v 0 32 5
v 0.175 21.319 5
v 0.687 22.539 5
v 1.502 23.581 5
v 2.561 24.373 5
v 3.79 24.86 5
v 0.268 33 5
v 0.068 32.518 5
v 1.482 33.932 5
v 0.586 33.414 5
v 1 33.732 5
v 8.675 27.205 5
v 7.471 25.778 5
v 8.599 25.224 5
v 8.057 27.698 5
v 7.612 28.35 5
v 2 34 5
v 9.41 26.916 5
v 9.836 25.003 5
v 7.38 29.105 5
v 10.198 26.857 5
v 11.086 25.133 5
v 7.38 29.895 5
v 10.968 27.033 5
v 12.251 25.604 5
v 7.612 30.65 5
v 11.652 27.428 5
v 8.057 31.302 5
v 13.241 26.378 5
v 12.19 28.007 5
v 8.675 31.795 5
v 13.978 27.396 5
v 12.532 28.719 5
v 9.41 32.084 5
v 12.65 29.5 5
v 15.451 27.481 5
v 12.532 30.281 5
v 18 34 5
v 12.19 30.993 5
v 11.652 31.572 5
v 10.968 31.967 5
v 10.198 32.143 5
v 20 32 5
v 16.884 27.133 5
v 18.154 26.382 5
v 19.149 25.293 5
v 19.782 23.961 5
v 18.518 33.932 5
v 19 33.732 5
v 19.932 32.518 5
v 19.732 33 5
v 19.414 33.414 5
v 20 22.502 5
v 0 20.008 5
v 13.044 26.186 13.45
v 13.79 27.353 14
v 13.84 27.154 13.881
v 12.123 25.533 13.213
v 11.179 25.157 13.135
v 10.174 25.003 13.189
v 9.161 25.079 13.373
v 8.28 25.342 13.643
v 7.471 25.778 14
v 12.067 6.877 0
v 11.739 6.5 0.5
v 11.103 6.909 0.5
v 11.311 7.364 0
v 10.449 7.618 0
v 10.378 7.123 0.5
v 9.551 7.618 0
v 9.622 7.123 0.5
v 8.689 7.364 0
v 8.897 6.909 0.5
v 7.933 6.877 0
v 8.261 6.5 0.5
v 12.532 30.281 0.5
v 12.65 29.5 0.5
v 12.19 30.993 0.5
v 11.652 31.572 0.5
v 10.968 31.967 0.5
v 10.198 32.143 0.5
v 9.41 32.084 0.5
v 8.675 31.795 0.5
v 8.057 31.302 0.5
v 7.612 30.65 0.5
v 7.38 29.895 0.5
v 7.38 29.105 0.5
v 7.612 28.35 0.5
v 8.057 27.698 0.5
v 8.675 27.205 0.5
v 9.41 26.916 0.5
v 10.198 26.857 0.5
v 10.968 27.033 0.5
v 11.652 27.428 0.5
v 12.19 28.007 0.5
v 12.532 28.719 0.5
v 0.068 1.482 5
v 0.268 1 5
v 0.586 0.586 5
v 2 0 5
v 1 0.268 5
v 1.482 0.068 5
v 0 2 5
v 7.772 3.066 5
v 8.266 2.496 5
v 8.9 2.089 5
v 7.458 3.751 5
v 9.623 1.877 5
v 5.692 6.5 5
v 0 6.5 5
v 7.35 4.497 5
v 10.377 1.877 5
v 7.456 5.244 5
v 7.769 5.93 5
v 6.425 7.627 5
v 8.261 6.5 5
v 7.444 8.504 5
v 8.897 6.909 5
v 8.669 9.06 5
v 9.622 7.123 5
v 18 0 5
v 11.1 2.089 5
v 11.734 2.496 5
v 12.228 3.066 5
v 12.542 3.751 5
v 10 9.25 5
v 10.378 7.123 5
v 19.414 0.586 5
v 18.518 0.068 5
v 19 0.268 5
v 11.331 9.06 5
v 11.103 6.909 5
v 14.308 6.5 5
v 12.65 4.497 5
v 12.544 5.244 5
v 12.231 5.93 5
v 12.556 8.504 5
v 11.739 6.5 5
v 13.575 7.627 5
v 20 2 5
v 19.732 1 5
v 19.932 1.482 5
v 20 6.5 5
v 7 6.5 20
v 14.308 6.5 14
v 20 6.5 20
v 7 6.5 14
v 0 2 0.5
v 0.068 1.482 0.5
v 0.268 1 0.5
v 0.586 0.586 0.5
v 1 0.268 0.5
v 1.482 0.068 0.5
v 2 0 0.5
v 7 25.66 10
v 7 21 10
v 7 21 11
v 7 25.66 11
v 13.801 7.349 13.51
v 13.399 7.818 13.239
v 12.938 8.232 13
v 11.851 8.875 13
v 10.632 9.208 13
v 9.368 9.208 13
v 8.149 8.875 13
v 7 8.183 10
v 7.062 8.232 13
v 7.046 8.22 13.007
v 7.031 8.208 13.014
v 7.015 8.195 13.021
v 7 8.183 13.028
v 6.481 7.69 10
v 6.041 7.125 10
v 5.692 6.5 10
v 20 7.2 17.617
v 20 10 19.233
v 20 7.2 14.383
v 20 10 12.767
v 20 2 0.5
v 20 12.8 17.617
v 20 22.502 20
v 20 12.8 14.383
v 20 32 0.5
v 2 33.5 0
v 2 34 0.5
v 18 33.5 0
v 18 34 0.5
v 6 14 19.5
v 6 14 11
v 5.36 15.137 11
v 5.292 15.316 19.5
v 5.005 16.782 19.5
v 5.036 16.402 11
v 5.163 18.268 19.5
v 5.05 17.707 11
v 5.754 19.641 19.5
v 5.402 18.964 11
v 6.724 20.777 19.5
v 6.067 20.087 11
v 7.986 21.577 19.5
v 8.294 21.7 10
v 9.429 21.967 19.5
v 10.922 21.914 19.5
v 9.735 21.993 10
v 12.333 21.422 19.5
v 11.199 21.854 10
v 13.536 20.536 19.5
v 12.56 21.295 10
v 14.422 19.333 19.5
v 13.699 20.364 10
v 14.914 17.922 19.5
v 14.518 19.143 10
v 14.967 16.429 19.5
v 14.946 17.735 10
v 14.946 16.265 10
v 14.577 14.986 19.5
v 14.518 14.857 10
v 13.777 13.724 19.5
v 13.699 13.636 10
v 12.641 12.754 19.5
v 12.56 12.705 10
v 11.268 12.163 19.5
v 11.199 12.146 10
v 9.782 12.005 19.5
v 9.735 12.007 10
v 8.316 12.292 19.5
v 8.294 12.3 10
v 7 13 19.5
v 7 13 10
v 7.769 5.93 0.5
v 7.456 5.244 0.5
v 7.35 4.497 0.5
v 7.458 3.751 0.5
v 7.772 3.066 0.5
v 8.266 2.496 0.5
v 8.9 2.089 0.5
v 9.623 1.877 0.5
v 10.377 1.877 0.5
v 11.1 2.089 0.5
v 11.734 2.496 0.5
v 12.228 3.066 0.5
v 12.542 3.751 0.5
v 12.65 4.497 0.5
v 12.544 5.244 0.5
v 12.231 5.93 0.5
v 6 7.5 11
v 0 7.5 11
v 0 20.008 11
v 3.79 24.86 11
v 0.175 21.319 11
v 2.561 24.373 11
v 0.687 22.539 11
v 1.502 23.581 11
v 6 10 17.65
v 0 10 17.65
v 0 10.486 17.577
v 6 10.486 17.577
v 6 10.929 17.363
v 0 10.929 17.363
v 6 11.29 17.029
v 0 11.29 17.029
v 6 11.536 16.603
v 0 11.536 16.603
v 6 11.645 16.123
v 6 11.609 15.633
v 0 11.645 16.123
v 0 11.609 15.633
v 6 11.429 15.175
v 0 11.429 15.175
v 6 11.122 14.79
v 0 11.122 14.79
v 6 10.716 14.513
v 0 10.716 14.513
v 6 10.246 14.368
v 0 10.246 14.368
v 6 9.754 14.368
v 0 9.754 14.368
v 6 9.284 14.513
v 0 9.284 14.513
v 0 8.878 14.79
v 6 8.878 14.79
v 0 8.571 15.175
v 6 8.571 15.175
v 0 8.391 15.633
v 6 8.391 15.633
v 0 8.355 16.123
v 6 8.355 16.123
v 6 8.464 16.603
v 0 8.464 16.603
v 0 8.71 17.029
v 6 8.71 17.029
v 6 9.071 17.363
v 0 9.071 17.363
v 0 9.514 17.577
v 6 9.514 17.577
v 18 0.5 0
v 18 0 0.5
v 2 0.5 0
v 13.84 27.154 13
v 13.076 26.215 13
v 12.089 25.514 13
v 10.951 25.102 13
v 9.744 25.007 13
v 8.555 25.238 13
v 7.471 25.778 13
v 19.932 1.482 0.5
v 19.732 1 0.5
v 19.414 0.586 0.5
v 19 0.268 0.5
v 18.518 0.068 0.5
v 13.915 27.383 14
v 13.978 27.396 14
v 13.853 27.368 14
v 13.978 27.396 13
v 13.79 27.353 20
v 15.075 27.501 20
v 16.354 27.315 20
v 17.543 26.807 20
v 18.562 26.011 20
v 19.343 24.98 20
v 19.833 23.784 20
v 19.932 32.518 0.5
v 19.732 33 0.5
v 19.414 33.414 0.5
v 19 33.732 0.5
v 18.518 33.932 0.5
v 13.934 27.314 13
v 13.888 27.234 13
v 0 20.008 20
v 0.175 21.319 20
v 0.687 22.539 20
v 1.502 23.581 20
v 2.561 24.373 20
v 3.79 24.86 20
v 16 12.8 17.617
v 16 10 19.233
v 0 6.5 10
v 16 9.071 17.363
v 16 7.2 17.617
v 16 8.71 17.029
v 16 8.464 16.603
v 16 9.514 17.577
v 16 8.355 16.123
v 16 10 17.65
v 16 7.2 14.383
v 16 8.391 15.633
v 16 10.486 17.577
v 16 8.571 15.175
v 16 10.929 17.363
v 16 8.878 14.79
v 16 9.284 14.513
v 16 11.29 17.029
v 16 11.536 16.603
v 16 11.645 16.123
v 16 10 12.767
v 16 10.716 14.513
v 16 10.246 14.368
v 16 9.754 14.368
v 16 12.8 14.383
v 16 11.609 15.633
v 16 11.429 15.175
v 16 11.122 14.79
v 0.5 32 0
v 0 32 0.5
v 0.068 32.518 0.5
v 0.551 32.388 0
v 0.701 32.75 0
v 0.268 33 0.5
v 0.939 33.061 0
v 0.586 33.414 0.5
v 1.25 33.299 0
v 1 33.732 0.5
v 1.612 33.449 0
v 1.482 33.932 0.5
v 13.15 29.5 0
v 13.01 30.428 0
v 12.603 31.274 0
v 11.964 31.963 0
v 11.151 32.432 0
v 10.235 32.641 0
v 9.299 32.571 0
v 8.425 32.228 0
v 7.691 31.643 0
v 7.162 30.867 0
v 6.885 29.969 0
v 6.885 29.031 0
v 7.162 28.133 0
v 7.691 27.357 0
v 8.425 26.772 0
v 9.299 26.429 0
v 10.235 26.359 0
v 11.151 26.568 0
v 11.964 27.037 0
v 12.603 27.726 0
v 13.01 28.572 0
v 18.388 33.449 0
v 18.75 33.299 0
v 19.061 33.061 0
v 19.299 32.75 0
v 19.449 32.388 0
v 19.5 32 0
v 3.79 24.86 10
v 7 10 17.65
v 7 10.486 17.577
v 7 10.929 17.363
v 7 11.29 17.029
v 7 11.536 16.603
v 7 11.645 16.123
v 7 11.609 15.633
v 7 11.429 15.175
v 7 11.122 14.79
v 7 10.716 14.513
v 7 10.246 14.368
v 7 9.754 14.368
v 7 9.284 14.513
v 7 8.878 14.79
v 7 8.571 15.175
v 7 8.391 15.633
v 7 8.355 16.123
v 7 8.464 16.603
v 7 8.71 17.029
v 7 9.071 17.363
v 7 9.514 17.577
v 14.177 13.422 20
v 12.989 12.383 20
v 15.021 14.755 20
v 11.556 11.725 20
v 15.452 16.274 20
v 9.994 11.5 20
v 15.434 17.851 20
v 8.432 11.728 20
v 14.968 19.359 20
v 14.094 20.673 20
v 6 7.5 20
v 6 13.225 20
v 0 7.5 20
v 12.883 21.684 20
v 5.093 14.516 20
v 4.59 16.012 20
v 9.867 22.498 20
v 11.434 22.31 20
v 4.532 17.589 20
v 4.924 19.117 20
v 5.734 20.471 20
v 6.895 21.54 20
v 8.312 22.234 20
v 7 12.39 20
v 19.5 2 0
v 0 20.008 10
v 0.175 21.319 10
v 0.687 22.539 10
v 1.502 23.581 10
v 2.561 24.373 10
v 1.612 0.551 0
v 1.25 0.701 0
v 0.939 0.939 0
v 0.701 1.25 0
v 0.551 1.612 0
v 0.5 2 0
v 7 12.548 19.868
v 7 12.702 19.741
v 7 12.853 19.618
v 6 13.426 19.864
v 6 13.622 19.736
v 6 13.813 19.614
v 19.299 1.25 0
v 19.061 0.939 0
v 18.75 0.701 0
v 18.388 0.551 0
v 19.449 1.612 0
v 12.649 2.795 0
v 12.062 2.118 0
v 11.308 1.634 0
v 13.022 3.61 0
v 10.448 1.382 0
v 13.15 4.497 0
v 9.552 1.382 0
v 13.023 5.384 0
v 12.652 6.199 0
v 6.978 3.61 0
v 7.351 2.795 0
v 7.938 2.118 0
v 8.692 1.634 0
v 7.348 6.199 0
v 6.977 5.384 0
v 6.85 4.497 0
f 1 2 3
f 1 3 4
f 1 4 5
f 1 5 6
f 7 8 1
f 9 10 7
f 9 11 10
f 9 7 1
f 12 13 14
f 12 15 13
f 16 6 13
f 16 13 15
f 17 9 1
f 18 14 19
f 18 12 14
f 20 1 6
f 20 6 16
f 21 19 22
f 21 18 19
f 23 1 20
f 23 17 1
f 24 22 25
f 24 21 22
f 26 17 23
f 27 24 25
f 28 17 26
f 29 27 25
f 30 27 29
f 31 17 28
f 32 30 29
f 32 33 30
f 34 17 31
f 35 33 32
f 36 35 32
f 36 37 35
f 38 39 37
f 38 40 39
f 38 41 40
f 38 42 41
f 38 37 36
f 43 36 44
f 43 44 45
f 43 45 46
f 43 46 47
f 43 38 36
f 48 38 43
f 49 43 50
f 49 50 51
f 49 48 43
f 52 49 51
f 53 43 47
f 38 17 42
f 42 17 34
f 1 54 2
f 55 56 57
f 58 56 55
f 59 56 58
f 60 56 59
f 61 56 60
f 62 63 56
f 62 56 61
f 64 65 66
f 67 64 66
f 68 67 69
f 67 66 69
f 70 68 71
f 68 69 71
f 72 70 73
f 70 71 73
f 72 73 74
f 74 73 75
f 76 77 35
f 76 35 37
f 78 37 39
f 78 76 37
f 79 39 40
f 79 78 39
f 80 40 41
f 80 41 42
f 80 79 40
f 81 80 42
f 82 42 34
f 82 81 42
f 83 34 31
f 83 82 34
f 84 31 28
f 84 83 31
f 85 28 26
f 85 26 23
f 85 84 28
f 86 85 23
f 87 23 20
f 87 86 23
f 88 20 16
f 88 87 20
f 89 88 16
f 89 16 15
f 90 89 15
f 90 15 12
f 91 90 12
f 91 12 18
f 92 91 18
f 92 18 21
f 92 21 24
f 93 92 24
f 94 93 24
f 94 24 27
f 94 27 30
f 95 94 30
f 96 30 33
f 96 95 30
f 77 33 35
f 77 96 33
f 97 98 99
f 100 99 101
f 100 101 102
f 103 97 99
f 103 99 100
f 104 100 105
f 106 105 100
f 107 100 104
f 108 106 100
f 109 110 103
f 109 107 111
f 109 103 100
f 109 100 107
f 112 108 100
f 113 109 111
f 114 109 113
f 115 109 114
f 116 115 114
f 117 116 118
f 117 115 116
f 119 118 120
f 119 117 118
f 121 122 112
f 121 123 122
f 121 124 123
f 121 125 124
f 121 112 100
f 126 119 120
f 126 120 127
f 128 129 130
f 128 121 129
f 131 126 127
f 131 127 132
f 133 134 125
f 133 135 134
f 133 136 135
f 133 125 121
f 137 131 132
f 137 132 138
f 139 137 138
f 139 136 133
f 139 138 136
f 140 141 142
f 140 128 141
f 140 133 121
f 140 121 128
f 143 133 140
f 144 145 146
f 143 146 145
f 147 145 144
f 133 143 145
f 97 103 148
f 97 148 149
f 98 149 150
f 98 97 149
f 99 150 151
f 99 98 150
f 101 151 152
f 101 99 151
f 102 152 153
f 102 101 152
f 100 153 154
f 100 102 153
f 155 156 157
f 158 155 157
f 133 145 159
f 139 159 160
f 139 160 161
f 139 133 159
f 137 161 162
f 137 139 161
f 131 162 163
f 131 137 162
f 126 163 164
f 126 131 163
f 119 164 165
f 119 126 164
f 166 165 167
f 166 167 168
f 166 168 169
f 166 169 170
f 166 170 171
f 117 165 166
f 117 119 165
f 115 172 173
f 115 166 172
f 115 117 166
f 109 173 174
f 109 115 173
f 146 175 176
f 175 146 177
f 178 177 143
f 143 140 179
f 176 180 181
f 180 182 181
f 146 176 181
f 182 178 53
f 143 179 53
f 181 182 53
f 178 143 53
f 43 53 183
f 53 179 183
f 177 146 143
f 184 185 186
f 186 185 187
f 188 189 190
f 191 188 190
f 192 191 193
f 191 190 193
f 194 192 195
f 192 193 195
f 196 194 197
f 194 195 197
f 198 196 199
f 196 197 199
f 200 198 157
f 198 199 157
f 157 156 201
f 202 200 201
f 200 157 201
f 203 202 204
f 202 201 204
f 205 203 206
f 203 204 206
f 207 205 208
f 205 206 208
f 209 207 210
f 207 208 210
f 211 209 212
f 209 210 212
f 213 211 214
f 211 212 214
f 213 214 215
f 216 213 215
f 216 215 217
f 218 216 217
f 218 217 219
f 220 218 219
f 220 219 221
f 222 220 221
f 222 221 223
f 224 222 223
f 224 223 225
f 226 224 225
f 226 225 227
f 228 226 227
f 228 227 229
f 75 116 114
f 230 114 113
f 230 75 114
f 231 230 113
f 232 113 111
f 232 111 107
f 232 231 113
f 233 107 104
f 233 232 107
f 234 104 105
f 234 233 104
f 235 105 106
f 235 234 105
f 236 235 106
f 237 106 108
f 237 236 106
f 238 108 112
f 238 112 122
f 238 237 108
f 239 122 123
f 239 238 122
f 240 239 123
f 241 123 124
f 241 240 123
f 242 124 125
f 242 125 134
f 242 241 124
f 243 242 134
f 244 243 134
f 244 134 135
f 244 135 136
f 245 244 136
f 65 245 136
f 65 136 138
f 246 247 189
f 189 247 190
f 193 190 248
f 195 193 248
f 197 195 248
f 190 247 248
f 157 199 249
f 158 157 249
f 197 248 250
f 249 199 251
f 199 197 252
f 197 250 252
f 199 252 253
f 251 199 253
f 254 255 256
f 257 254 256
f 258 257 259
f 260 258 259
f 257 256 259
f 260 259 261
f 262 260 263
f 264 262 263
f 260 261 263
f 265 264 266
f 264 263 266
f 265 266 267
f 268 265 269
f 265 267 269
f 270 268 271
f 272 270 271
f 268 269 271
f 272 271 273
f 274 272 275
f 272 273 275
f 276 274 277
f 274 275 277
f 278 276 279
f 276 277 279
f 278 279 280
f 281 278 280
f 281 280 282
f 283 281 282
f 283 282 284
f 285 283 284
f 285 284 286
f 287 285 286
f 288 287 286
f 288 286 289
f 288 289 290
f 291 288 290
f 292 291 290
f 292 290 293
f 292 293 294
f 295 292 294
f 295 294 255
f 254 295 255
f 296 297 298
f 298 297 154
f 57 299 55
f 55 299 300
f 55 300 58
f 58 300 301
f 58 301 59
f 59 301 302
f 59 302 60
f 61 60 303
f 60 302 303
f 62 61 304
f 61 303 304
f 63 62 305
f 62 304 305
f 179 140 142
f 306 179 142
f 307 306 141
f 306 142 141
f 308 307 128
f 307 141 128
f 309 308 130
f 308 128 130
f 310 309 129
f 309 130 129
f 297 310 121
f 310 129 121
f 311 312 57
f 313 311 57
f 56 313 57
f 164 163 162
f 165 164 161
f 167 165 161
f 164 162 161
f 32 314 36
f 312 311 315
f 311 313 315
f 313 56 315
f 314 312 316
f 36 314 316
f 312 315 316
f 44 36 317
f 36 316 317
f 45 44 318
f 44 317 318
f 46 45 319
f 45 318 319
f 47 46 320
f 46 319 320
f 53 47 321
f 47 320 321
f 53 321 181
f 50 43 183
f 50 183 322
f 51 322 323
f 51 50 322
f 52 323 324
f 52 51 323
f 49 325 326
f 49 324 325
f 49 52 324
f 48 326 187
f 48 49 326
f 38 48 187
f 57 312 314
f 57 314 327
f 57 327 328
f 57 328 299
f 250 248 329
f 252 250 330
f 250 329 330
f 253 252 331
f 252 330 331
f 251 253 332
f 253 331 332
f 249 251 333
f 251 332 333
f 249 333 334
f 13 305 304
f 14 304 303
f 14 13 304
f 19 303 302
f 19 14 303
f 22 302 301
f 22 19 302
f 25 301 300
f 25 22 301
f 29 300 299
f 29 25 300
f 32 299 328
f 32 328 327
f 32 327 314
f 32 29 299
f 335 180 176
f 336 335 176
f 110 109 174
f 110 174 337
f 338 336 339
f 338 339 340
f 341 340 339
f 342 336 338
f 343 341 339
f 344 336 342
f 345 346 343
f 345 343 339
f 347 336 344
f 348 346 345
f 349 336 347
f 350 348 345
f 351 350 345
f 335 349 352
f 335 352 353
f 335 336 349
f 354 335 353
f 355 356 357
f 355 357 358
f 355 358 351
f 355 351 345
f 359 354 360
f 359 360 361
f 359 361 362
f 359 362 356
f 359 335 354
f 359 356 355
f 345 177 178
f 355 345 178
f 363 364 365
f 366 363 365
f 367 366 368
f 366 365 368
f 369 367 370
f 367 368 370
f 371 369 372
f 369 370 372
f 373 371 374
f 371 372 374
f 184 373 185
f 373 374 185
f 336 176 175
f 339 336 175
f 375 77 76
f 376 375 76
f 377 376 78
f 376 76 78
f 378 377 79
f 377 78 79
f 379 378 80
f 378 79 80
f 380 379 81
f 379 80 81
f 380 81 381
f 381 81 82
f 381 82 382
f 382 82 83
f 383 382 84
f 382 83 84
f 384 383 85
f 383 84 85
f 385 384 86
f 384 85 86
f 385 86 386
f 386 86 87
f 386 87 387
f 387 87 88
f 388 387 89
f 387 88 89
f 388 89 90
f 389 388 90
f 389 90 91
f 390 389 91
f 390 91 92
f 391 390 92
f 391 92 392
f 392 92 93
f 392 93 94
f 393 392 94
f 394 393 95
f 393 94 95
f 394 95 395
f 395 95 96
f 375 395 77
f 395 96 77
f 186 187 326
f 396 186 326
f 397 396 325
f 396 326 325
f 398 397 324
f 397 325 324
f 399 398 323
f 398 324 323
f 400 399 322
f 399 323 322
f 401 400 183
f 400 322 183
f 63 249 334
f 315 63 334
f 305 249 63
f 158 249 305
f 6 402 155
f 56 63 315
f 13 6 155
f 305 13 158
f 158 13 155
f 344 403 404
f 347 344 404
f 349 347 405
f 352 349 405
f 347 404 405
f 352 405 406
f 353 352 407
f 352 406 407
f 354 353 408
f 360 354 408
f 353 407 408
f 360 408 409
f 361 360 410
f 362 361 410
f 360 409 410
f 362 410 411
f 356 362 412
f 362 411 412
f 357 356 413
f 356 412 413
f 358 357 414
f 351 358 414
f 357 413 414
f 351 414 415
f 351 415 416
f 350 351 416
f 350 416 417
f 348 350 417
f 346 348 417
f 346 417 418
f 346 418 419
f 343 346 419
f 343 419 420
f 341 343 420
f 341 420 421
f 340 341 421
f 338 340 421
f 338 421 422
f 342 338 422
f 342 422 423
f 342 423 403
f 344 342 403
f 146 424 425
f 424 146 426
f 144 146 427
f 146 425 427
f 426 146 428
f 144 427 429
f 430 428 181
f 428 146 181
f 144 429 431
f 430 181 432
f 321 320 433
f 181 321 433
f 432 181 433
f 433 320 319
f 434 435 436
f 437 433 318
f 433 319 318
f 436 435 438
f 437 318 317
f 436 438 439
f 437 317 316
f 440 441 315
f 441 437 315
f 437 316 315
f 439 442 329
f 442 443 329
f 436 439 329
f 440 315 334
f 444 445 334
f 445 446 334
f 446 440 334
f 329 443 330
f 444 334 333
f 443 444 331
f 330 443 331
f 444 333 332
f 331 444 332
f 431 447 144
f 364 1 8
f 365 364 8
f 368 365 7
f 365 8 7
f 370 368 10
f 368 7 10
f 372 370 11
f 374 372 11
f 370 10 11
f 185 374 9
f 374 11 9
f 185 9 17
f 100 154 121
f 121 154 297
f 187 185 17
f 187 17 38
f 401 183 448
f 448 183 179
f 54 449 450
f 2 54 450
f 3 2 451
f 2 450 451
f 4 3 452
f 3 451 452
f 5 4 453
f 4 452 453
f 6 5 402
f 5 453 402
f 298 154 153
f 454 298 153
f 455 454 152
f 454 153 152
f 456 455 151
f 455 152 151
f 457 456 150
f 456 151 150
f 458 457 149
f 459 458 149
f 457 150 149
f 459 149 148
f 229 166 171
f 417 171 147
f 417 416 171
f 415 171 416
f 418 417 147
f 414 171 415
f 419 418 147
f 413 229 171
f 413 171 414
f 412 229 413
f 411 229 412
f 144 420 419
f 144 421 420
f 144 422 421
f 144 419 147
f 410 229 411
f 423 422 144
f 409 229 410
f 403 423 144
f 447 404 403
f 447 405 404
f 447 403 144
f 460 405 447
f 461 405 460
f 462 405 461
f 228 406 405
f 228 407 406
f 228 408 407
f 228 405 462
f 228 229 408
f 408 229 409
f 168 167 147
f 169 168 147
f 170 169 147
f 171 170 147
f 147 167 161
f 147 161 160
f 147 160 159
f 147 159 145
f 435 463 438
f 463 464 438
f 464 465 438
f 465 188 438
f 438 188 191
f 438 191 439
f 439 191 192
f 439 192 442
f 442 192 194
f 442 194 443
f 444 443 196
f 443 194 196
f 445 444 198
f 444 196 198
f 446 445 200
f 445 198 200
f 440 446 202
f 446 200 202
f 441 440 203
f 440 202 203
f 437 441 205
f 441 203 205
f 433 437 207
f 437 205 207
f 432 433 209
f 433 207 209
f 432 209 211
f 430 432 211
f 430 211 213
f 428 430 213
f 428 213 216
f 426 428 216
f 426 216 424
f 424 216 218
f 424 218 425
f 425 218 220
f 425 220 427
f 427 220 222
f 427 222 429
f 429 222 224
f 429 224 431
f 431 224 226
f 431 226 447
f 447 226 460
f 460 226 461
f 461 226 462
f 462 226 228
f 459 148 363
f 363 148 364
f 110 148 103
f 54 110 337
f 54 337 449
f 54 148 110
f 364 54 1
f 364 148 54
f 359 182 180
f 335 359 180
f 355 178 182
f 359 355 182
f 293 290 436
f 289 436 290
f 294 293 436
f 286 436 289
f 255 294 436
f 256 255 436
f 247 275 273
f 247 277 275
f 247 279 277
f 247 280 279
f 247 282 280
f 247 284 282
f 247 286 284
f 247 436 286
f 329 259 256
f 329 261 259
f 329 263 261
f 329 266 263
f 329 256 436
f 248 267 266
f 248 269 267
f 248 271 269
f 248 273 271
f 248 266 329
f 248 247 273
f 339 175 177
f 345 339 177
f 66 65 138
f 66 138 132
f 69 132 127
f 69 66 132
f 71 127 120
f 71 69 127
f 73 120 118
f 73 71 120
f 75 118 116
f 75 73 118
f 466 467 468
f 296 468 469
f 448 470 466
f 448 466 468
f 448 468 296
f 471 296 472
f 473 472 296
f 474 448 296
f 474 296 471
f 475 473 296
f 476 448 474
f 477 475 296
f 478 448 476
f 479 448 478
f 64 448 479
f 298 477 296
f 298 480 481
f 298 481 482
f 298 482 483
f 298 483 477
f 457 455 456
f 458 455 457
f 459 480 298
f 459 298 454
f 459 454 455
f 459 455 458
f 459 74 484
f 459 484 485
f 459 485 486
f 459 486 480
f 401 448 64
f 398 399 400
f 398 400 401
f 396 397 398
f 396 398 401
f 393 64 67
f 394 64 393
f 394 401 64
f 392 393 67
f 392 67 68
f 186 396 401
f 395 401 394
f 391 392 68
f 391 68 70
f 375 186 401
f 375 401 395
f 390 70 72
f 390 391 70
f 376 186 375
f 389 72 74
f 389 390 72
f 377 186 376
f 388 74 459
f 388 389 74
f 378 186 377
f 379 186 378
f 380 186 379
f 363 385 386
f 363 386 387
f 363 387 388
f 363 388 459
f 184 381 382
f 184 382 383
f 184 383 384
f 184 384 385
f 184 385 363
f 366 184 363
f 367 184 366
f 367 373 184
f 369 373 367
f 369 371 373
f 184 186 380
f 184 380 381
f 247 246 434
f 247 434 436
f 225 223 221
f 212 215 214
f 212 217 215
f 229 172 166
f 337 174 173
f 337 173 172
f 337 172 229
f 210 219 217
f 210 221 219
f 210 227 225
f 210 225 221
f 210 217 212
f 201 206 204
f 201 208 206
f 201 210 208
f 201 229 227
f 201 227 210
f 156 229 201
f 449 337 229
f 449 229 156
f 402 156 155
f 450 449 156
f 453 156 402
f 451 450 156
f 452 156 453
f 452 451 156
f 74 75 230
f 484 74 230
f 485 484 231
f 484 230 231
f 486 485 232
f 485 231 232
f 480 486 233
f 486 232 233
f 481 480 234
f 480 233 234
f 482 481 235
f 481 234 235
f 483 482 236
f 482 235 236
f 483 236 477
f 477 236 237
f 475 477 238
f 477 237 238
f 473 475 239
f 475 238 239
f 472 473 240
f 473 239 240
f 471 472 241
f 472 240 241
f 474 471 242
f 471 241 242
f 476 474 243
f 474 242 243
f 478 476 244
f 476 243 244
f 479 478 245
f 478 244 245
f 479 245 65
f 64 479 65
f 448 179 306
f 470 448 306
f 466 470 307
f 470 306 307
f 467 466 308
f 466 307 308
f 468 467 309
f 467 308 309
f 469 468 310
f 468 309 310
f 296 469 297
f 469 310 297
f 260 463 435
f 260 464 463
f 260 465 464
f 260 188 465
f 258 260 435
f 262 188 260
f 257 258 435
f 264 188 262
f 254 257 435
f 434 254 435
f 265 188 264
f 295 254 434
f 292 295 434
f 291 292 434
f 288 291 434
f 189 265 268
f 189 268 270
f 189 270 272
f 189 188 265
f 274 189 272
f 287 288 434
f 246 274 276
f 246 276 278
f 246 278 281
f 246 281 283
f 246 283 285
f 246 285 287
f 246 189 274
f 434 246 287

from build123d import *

# Parameters (mm, degrees)
ESBO_O1_W                = 20
ESBO_O1_H                = 34
ESBO_O1_R                = 5
ESBO_O1_R_2              = 2.65
RESSALTO_EXTRUS_O1_DEPTH = 5
ESBO_O2_R                = 5
RESSALTO_EXTRUS_O2_DEPTH = 20
CORTE_EXTRUS_O1_START    = -9
CORTE_EXTRUS_O1_DEPTH    = 9
CORTE_EXTRUS_O3_REACH    = 46.227
ESBO_O5_R                = 1.65
CORTE_EXTRUS_O2_DEPTH    = 4
FILETE1_R                = 5
FILETE2_R                = 2
CORTE_EXTRUS_O4_START    = -15
ESBO_O6_R                = 4.75
CORTE_EXTRUS_O4_DEPTH    = 8
ESBO_O7_R                = 5
RESSALTO_EXTRUS_O3_DEPTH = 10
ESBO_O8_W                = 1
ESBO_O8_H                = 21.001730979
CORTE_EXTRUS_O5_DEPTH    = 7
ESBO_O10_R               = 4.5
CORTE_EXTRUS_O7_DEPTH    = 8
CHANFRO5_SIZE            = 1.732050808
CHANFRO5_SIZE_2          = 1
CORTE_EXTRUS_O8_START    = -10
CORTE_EXTRUS_O8_DEPTH    = 10
CHANFRO2_SIZE            = 0.5


with BuildPart() as part:
    # Esboço1 → Ressalto-extrusão1 (new body)
    with BuildSketch(Plane.XY):
        with Locations((10, 17)):
            Rectangle(ESBO_O1_W, ESBO_O1_H)
        with Locations((10, 17)):
            Circle(ESBO_O1_R, mode=Mode.SUBTRACT)
        with Locations((10, 29.5)):
            Circle(ESBO_O1_R_2, mode=Mode.SUBTRACT)
        with Locations((10, 4.5)):
            Circle(ESBO_O1_R_2, mode=Mode.SUBTRACT)
    extrude(amount=RESSALTO_EXTRUS_O1_DEPTH)

    # Esboço2 → Ressalto-extrusão2 (add)
    with BuildSketch(Plane(origin=(0, 0, 0), x_dir=(-1, 0, 0), z_dir=(0, 0, -1))):
        Polygon((0, 23.914879084), (-20, 28.90143914), (-20, 6.5), (0, 6.5), align=None)
        with Locations((-10, 17)):
            Circle(ESBO_O2_R, mode=Mode.SUBTRACT)
    extrude(amount=-RESSALTO_EXTRUS_O2_DEPTH)

    # Esboço3 → Corte-extrusão1 (cut)
    with BuildSketch(Plane.XY.offset(20).offset(CORTE_EXTRUS_O1_START)):
        with BuildLine():
            Line((6, 14), (6, 7.5))
            Line((6, 7.5), (0, 7.5))
            Line((0, 7.5), (0, 6.5))
            Line((0, 6.5), (7, 6.5))
            Line((7, 6.5), (7, 13))
            ThreePointArc((7, 13), (6.464466094, 13.464466094), (6, 14))
        make_face()
    extrude(amount=CORTE_EXTRUS_O1_DEPTH, mode=Mode.SUBTRACT)

    # Corte-extrusão3: up to this face of the body (flat: up to its plane)
    corte_extrus_o3_end = Plane(part.part.faces().sort_by_distance((20, 17.465309995, 9.140459531))[0])
    # Esboço5 → Corte-extrusão3 (cut, up to the picked face)
    with BuildSketch(Plane.ZY, mode=Mode.PRIVATE) as corte_extrus_o3_sk1:
        with Locations((16, 10)):
            Circle(ESBO_O5_R)
    corte_extrus_o3_tool1 = split(extrude(corte_extrus_o3_sk1.sketch, amount=-CORTE_EXTRUS_O3_REACH, mode=Mode.PRIVATE), bisect_by=corte_extrus_o3_end, keep=Keep.BOTH, mode=Mode.PRIVATE)
    add(corte_extrus_o3_tool1.solids().sort_by(Axis((0, 10, 16), (1, 0, 0)))[0], mode=Mode.SUBTRACT)

    # Esboço4 → Corte-extrusão2 (cut)
    with BuildSketch(Plane(origin=(20, 0, 0), x_dir=(0, 0, -1), z_dir=(1, 0, 0))):
        Polygon((-19.233161507, 10), (-17.616580754, 7.2), (-14.383419246, 7.2), (-12.766838493, 10), (-14.383419246, 12.8), (-17.616580754, 12.8), align=None)
    extrude(amount=-CORTE_EXTRUS_O2_DEPTH, mode=Mode.SUBTRACT)

    # Filete1
    filete1_edges = [part.edges().sort_by_distance(p)[0] for p in [
        (0, 23.914879084, 12.5),
        (20, 28.90143914, 12.5),
    ]]
    fillet(filete1_edges, radius=FILETE1_R)

    # Filete2
    filete2_edges = [part.edges().sort_by_distance(p)[0] for p in [
        (0, 34, 2.5),
        (20, 34, 2.5),
        (20, 0, 2.5),
        (0, 0, 2.5),
    ]]
    fillet(filete2_edges, radius=FILETE2_R)

    # Esboço6 → Corte-extrusão4 (cut)
    with BuildSketch(Plane.XY.offset(20).offset(CORTE_EXTRUS_O4_START)):
        with Locations((10, 4.5)):
            Circle(ESBO_O6_R)
    extrude(amount=CORTE_EXTRUS_O4_DEPTH, mode=Mode.SUBTRACT)

    # Esboço7 → Ressalto-extrusão3 (add)
    with BuildSketch(Plane(origin=(0, 0, 0), x_dir=(-1, 0, 0), z_dir=(0, 0, -1))):
        with Locations((-10, 17)):
            Circle(ESBO_O7_R)
    extrude(amount=-RESSALTO_EXTRUS_O3_DEPTH)

    # Esboço8 → Corte-extrusão5 (cut)
    with BuildSketch(Plane.ZY):
        with Locations((10.5, 17.00086549)):
            Rectangle(ESBO_O8_W, ESBO_O8_H)
    extrude(amount=-CORTE_EXTRUS_O5_DEPTH, mode=Mode.SUBTRACT)

    # Esboço10 → Corte-extrusão7 (cut)
    with BuildSketch(Plane.XY.offset(5)):
        with Locations((10, 29.5)):
            Circle(ESBO_O10_R)
    extrude(amount=CORTE_EXTRUS_O7_DEPTH, mode=Mode.SUBTRACT)

    # Chanfro5
    # the kernel refuses this chamfer: 1.732050808, 1 mm, written as the material it takes off along each edge
    with BuildSketch(Plane(origin=(18.789385955, 6.5, 13), x_dir=(0, 0.9998132206222079, -0.019326765612700685), z_dir=(-1, 0, 0))) as chanfro5_piece_1_section:
        Polygon((CHANFRO5_SIZE * 0.999813220373, -CHANFRO5_SIZE * 0.0193267656079), (-CHANFRO5_SIZE_2 * 0.0193267656127, -CHANFRO5_SIZE_2 * 0.999813220622), (0, 0), align=None)
    chanfro5_piece_1 = extrude(amount=16.270349926, mode=Mode.PRIVATE)
    chanfro5_piece_1 = chanfro5_piece_1 & Plane(origin=(10, 4.5, 13.142171605), x_dir=(1, 0, 0), z_dir=(0, 0, -1)) * Cylinder(4.75, 40, mode=Mode.PRIVATE)
    add(chanfro5_piece_1, mode=Mode.SUBTRACT)
    with BuildSketch(Plane(origin=(3.123434693, 24.693638818, 13), x_dir=(-0.014005792936040639, 0.056174167266921864, 0.9983227437537926), z_dir=(0.9702957262759956, 0.2419218955996716, 0))) as chanfro5_piece_2_section:
        Polygon((CHANFRO5_SIZE_2 * 0.998322743754, CHANFRO5_SIZE_2 * 0.0578938624027), (-CHANFRO5_SIZE * 0.0578938623883, CHANFRO5_SIZE * 0.998322743505), (0, 0), align=None)
    chanfro5_piece_2 = extrude(amount=10.993510061, mode=Mode.PRIVATE)
    chanfro5_piece_2 = chanfro5_piece_2 & Plane(origin=(10, 29.5, 13.381027624), x_dir=(1, 0, 0), z_dir=(0, 0, -1)) * Cylinder(4.5, 29, mode=Mode.PRIVATE)
    add(chanfro5_piece_2, mode=Mode.SUBTRACT)
    with BuildSketch(Plane(origin=(15, 22.501730979, 13), x_dir=(0.6367879492997914, 0.7710389793172368, 0), z_dir=(0.7710389793172368, -0.6367879492997914, 0))) as chanfro5_piece_3_section:
        Polygon((5 - CHANFRO5_SIZE, 0), (5, CHANFRO5_SIZE_2), (5, 0), align=None)
    chanfro5_piece_3 = revolve(axis=Axis((15, 22.501730979, 13), (0, 0, 1)), revolution_arc=53.552719823, mode=Mode.PRIVATE)
    chanfro5_piece_3 = chanfro5_piece_3 & Plane(origin=(10, 29.5, 13.480391977), x_dir=(1, 0, 0), z_dir=(0, 0, -1)) * Cylinder(4.5, 20, mode=Mode.PRIVATE)
    add(chanfro5_piece_3, mode=Mode.SUBTRACT)

    # Esboço11 → Corte-extrusão8 (cut)
    with BuildSketch(Plane.XY.offset(5).offset(CORTE_EXTRUS_O8_START)):
        with BuildLine():
            ThreePointArc((8.261466135, 6.5), (10, 1.85), (11.738533865, 6.5))
            ThreePointArc((11.738533865, 6.5), (10, 7.15), (8.261466135, 6.5))
        make_face()
    extrude(amount=CORTE_EXTRUS_O8_DEPTH, mode=Mode.SUBTRACT)

    # Chanfro2
    chanfro2_edges = [part.edges().sort_by_distance(p)[0] for p in [
        (10, 34, 0),
        (20, 17, 0),
        (10, 0, 0),
        (0, 17, 0),
        (0.585786438, 33.414213562, 0),
        (0.585786438, 0.585786438, 0),
        (19.414213562, 0.585786438, 0),
        (19.414213562, 33.414213562, 0),
        (7.35, 29.5, 0),
        (8.261466135, 2.5, 0),
        (13.535533906, 20.535533906, 20),
    ]]
    chamfer(chanfro2_edges, length=CHANFRO2_SIZE)


solid = part.part
